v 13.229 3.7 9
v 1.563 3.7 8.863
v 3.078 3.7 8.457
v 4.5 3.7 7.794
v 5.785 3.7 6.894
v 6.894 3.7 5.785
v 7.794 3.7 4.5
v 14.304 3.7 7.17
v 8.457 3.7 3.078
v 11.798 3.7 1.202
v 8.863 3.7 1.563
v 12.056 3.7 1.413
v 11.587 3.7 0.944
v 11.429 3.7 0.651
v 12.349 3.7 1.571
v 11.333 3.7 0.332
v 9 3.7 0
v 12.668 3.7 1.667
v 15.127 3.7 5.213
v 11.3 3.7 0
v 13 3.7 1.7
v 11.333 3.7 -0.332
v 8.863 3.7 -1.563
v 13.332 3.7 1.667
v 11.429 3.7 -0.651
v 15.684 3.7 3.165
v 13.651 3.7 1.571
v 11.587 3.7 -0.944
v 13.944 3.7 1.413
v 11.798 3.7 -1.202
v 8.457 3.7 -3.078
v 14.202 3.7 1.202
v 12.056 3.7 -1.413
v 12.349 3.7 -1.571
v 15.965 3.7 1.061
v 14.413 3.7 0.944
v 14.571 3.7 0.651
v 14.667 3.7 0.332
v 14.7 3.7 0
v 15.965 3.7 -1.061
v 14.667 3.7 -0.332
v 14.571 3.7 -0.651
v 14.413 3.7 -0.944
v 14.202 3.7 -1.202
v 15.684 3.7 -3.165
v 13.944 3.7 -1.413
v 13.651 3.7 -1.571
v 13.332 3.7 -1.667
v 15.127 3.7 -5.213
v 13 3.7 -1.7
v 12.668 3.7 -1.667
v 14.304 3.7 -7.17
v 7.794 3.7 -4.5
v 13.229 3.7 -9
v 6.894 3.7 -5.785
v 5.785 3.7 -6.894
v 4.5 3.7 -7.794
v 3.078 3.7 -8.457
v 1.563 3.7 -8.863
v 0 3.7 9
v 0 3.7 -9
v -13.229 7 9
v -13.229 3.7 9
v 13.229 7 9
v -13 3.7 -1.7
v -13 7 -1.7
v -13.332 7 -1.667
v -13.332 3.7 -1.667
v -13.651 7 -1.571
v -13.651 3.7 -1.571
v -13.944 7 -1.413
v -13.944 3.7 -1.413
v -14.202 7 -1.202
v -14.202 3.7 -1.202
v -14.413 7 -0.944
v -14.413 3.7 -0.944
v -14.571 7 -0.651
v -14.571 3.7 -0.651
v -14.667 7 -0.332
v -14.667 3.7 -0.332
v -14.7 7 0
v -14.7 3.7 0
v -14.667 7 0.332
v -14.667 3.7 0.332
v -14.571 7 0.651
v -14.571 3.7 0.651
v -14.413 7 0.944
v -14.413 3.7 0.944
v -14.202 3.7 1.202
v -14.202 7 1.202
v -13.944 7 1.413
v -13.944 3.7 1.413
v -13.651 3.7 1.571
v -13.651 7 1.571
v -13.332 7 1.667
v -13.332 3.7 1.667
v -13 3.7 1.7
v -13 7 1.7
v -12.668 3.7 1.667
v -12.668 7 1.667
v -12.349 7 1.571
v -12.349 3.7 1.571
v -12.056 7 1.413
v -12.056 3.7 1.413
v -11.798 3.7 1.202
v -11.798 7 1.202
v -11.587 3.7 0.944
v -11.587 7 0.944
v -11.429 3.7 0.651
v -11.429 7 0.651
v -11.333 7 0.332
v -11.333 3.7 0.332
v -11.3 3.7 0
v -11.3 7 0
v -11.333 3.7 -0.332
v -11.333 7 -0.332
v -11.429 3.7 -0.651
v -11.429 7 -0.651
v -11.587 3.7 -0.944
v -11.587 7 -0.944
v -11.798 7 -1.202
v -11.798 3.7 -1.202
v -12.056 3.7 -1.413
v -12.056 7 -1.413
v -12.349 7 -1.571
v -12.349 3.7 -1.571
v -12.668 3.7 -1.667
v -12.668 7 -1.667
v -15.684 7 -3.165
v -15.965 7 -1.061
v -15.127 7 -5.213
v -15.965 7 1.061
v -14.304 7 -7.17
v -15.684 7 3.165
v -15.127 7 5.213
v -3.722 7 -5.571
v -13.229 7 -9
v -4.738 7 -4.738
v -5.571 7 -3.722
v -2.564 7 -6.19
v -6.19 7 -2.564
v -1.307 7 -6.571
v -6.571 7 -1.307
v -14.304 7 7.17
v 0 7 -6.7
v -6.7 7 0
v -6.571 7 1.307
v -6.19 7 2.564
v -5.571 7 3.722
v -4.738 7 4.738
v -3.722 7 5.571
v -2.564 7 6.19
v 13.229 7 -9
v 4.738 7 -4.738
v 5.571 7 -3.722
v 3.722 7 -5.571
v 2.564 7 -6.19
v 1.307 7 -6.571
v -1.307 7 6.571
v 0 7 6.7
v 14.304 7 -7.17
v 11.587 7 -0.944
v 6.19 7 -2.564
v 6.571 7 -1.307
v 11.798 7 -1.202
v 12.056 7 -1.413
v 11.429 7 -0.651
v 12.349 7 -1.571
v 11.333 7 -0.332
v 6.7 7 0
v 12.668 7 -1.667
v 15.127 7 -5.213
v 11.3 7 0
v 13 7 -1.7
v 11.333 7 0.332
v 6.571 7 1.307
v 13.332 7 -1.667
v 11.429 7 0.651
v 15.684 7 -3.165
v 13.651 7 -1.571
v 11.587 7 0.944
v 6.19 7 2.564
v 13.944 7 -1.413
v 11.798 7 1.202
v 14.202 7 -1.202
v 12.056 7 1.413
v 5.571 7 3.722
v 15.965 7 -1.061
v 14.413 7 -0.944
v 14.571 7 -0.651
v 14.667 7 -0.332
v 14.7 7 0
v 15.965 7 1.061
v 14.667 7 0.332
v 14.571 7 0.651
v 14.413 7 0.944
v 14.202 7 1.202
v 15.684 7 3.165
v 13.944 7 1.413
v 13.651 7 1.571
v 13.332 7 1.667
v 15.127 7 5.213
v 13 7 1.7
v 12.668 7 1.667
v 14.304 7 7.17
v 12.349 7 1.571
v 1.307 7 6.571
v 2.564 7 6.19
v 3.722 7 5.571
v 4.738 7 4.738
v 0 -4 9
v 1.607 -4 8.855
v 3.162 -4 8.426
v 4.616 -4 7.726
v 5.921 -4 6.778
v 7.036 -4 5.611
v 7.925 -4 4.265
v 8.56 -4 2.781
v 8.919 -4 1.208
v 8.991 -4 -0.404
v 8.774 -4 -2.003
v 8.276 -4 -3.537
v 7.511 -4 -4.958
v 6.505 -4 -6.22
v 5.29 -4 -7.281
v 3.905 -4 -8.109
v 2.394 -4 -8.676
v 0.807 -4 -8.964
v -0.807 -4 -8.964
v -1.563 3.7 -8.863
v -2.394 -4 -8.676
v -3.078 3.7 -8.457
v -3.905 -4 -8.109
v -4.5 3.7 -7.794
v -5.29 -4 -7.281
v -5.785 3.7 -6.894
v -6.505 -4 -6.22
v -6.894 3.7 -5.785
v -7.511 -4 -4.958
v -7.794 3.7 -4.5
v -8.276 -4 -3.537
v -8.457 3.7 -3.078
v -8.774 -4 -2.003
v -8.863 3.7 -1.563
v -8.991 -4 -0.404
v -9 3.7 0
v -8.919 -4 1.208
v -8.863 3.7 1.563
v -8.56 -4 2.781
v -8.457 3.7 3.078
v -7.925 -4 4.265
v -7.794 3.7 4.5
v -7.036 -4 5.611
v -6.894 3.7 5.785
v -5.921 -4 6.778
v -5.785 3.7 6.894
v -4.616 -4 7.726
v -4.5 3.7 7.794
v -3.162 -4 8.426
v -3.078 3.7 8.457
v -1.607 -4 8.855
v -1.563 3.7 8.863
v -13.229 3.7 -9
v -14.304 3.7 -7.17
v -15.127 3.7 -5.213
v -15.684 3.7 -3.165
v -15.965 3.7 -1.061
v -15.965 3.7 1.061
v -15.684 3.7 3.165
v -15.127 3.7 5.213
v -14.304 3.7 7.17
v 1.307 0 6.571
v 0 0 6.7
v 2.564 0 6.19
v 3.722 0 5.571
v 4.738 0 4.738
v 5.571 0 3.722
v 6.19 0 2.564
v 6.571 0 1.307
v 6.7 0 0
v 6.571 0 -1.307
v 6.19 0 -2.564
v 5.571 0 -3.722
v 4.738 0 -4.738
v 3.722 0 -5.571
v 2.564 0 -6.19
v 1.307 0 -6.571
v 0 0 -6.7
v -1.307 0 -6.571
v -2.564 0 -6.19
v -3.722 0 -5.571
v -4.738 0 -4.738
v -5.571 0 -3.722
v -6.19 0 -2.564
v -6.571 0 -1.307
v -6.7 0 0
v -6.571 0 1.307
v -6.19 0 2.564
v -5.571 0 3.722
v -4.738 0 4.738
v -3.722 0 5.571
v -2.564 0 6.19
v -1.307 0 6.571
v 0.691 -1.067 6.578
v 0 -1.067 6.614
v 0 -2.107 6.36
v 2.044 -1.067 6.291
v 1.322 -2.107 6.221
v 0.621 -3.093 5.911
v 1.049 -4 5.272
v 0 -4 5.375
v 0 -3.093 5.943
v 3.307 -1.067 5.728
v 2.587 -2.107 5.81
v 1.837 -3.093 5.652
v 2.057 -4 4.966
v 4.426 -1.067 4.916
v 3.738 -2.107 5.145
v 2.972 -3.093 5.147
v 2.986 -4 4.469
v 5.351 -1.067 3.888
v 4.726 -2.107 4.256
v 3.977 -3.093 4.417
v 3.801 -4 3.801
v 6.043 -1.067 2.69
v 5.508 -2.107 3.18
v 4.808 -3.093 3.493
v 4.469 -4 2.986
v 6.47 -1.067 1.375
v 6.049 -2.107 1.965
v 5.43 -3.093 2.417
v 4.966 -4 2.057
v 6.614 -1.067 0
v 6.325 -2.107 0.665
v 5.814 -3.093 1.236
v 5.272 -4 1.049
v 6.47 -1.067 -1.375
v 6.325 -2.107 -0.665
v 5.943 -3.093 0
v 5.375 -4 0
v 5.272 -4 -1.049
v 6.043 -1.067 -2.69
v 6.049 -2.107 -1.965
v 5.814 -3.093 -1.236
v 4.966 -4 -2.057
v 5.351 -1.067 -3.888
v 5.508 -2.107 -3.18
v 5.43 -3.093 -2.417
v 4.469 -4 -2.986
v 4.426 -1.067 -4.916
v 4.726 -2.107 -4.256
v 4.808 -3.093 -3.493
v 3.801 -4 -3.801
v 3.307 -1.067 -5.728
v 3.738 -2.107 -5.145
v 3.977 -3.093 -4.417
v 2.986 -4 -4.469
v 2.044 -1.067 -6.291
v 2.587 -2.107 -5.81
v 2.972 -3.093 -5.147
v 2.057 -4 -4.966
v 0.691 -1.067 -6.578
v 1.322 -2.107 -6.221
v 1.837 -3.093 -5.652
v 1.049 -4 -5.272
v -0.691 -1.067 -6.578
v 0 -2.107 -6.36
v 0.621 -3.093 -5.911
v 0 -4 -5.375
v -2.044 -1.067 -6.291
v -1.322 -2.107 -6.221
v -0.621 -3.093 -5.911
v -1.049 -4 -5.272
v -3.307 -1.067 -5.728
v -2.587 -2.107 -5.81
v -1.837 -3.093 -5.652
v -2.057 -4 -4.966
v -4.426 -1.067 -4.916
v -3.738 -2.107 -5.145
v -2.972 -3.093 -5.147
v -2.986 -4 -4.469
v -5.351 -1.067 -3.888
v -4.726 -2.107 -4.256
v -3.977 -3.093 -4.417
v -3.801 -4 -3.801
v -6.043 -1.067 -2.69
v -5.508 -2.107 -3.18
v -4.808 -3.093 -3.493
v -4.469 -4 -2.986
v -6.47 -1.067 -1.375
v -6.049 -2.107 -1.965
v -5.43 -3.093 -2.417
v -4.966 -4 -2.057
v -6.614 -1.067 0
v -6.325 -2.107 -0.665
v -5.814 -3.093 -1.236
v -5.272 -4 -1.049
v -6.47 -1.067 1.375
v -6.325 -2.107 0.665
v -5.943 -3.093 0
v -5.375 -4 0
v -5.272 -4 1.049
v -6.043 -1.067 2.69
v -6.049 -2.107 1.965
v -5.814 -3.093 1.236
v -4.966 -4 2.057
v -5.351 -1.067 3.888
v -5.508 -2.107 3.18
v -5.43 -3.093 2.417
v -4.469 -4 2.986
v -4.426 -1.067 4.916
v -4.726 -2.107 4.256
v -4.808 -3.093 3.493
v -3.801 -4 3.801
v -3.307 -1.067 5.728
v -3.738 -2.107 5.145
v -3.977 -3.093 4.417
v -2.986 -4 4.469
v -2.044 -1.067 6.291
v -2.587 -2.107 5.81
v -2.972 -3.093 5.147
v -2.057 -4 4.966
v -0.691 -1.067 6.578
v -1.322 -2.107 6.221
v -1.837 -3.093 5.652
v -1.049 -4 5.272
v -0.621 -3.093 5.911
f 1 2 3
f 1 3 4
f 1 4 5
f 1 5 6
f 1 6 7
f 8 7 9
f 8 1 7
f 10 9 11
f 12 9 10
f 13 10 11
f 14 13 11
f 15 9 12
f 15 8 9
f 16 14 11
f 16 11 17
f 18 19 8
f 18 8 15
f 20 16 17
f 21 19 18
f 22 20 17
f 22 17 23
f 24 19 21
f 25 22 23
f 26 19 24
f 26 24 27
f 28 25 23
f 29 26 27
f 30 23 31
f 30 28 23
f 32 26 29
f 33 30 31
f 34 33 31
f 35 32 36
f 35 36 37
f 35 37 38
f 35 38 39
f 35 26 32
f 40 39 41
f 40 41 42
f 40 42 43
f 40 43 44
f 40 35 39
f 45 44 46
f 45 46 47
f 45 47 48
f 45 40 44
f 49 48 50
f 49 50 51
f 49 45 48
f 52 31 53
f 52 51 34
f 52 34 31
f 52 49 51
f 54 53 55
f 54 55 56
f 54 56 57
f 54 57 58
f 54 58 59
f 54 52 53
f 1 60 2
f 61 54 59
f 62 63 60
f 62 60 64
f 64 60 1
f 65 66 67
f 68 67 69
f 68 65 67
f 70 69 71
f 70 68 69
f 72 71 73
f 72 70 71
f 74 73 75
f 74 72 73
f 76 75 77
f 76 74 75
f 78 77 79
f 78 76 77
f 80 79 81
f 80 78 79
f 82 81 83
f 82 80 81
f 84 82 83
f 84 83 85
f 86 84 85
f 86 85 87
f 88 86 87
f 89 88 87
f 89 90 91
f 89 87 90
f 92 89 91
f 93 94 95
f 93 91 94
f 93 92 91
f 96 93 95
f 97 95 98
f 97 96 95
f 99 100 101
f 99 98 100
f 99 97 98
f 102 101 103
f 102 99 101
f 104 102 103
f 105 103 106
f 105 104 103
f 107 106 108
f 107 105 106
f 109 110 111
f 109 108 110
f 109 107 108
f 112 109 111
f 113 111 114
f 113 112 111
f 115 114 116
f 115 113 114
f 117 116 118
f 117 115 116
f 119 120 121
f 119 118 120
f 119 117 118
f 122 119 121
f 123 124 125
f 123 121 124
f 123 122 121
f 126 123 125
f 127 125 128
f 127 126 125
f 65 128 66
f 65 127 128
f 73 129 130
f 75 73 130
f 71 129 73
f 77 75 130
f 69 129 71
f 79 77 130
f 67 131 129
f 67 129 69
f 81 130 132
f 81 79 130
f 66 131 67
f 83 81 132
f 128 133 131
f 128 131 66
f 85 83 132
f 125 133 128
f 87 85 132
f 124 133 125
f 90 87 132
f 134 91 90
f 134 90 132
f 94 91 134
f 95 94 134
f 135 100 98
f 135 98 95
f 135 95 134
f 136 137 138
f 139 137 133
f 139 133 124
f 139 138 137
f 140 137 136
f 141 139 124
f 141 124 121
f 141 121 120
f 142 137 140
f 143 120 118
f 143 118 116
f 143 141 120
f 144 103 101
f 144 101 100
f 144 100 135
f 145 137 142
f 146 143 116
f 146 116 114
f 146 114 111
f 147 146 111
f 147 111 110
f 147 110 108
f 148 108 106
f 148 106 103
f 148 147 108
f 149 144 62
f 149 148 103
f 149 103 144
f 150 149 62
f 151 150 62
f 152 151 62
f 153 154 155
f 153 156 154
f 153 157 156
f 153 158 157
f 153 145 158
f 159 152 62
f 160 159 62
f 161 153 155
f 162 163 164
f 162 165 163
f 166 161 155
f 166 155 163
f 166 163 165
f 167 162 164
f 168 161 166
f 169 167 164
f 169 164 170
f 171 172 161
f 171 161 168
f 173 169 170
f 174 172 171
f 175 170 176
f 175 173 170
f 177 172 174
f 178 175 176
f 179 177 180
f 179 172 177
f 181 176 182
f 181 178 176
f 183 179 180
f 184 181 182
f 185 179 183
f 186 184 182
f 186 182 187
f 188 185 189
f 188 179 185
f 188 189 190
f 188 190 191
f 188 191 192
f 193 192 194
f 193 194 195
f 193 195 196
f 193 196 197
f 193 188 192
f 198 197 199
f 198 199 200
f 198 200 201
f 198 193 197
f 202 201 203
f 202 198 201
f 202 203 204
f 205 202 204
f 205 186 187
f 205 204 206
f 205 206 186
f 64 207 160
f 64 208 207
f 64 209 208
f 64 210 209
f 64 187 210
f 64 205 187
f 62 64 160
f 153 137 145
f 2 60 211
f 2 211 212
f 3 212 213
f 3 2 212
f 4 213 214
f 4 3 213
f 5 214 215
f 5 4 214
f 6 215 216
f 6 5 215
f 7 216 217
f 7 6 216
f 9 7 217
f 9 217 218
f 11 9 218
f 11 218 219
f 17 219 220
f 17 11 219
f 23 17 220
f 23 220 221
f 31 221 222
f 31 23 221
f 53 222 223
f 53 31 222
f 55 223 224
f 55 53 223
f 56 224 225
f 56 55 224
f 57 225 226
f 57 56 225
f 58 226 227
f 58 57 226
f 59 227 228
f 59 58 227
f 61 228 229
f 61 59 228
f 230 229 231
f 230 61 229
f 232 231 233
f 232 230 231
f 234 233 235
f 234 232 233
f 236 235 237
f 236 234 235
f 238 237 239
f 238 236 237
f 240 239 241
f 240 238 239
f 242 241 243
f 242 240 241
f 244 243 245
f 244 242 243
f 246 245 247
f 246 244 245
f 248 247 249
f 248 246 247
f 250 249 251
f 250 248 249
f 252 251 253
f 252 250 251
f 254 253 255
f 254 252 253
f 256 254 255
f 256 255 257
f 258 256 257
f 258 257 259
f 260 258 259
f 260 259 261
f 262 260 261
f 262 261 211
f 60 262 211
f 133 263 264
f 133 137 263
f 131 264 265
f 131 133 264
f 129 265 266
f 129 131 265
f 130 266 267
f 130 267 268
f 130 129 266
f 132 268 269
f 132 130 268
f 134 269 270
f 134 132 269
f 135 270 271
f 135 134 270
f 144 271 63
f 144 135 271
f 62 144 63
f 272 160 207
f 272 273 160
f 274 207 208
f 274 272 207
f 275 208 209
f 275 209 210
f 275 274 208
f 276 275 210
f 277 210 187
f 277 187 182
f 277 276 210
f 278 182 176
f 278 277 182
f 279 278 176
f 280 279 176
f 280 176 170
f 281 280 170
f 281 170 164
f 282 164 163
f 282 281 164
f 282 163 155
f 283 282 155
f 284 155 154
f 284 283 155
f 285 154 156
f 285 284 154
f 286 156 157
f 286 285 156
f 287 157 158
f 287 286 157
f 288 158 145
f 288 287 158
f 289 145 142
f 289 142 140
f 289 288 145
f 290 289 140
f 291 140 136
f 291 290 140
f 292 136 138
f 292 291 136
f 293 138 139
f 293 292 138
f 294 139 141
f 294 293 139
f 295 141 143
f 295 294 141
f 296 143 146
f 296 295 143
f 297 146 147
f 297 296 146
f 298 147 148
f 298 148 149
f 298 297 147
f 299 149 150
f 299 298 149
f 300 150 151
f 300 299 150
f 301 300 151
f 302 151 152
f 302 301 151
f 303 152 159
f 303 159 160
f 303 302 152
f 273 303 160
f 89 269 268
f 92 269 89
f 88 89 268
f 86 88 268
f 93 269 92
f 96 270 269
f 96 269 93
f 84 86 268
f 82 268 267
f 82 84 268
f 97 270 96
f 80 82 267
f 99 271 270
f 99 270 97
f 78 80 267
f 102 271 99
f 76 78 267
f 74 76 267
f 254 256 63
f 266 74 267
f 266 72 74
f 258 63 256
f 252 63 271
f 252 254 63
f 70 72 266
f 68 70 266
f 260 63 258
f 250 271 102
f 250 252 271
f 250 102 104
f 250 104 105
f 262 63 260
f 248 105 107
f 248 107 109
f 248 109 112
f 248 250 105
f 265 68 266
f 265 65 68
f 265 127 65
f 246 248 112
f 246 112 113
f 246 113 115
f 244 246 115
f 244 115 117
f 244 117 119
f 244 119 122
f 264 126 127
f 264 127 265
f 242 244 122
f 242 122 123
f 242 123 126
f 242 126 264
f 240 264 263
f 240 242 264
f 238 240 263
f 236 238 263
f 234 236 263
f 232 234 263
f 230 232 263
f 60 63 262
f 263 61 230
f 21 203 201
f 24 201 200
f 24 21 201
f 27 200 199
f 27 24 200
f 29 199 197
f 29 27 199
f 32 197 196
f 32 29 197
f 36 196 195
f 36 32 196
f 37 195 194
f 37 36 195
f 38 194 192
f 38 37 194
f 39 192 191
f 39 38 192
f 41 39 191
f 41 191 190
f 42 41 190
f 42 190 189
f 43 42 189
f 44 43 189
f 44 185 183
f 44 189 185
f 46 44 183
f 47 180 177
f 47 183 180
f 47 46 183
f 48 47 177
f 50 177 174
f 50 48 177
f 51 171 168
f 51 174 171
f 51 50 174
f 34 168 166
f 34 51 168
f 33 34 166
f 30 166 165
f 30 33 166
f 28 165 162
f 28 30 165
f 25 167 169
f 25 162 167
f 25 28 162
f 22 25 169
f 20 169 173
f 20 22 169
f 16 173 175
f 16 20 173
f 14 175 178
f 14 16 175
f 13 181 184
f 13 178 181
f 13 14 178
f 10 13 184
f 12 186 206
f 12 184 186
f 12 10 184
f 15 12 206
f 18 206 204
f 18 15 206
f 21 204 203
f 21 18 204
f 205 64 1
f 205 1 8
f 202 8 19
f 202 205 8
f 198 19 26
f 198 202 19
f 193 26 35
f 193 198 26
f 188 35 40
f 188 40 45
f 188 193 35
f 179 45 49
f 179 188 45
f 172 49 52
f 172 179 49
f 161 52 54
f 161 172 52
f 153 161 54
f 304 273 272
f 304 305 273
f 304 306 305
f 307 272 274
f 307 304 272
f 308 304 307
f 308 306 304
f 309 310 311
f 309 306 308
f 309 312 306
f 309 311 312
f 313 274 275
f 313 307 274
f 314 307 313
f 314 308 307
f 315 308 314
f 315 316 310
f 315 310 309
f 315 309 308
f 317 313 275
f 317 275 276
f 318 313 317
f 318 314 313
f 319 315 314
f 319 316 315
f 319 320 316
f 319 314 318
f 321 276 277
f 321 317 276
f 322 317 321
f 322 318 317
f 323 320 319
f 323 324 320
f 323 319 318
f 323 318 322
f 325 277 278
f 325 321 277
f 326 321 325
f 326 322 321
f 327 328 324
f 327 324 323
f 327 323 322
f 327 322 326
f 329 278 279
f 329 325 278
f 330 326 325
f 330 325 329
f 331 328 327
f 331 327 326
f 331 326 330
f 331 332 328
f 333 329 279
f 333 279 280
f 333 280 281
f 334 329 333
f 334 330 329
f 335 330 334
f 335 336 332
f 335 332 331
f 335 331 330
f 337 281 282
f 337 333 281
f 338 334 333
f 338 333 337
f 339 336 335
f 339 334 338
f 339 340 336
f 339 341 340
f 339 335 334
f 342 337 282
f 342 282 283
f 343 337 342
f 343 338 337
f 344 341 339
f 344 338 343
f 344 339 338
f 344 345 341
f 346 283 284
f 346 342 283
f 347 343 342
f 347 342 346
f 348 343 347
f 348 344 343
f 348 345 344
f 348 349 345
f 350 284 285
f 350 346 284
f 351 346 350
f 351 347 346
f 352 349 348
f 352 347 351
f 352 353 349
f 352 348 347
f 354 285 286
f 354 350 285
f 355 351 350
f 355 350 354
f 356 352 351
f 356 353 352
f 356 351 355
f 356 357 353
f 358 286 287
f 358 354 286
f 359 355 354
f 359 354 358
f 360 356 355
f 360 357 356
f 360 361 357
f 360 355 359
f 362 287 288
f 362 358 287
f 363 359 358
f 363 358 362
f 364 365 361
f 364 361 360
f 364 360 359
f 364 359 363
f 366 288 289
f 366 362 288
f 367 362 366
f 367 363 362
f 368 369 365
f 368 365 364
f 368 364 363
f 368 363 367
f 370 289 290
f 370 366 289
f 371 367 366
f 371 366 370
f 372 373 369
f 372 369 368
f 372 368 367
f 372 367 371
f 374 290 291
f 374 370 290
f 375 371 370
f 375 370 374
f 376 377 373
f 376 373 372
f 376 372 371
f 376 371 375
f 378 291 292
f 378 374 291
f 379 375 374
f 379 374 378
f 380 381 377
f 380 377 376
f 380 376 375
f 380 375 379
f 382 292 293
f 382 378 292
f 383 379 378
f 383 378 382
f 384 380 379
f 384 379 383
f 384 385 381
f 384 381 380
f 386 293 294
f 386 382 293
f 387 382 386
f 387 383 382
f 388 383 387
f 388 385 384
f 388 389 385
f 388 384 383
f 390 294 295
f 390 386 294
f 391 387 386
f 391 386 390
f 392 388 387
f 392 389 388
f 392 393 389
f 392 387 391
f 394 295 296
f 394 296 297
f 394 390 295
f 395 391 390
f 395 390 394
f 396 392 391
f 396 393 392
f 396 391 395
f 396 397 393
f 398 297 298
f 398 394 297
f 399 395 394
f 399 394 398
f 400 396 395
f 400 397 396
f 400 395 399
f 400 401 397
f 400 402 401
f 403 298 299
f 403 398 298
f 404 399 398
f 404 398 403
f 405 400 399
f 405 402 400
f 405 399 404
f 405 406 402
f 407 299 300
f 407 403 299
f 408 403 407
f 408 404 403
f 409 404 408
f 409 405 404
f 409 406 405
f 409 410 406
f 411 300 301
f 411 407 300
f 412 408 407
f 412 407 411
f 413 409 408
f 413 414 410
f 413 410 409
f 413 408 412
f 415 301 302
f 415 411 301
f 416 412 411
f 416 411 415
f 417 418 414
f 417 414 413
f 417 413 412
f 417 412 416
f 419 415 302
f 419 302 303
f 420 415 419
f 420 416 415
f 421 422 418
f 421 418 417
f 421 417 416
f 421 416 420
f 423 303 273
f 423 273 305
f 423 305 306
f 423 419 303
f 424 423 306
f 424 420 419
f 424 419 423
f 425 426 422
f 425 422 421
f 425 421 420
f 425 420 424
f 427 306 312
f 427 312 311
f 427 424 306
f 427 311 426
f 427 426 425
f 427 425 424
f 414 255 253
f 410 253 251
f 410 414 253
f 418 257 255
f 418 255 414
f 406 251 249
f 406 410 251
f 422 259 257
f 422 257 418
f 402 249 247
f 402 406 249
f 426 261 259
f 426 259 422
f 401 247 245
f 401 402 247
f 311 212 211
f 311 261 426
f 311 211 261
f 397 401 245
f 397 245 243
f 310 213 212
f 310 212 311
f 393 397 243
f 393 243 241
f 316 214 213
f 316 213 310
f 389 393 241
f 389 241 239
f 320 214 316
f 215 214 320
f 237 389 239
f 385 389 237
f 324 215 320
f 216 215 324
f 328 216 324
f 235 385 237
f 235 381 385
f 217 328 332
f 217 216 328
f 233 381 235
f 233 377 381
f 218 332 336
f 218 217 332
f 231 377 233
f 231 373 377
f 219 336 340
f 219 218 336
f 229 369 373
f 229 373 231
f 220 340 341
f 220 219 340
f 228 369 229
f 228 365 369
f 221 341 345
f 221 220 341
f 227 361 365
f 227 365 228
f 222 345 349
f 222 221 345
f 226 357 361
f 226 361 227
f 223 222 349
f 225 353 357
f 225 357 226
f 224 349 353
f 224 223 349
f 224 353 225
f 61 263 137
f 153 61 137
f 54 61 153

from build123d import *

# Parameters (mm, degrees)
CIRPATTERN2_COUNT  = 2
SKETCH5_W          = 50.426982916
SKETCH5_H          = 37.261009064
SKETCH5_W_2        = 37.991098709
SKETCH5_H_2        = 18
CUT_EXTRUDE1_DEPTH = 4.3


with BuildPart() as part:
    # Sketch1 → Revolve1 (revolve)
    with BuildSketch(Plane(origin=(0, 0, 0), x_dir=(0, 0, -1), z_dir=(1, 0, 0))):
        with BuildLine():
            ThreePointArc((-6.7, 0), (-6.360114404, -2.10688034), (-5.37494186, -4))
            Line((-5.37494186, -4), (-9, -4))
            Line((-9, -4), (-9, 3.7))
            Line((-9, 3.7), (-16, 3.7))
            Line((-16, 3.7), (-16, 7))
            Line((-16, 7), (-6.7, 7))
            Line((-6.7, 7), (-6.7, 0))
        make_face()
    revolve(axis=Axis((0, 0, 0), (0, 1, 0)))

    # Sketch3 → M3 Clearance Hole1 (revolve, cut)
    with BuildSketch(Plane(origin=(-13, 3.7, 0), x_dir=(0, 0, -1), z_dir=(1, 0, 0))):
        Polygon((0, 0), (0, 11.021463052), (1.7, 10), (1.7, 0), align=None)
    m3_clearance_hole1 = revolve(axis=Axis((-13, -2.65, 0), (0, 1, 0)), mode=Mode.SUBTRACT)

    # CirPattern2: M3 Clearance Hole1 ×2 about axis
    cirpattern2_axis = Axis((0, 0, 0), (0, 1, 0))
    for i in range(1, CIRPATTERN2_COUNT):
        add(m3_clearance_hole1.rotate(cirpattern2_axis, i * 360 / CIRPATTERN2_COUNT), mode=Mode.SUBTRACT)

    # Sketch5 → Cut-Extrude1 (cut, through all)
    with BuildSketch(Plane.XZ.offset(-3.7)):
        with Locations((1.488148737, -0.857756759)):
            Rectangle(SKETCH5_W, SKETCH5_H)
        with Locations((1.919239442, 0)):
            Rectangle(SKETCH5_W_2, SKETCH5_H_2, mode=Mode.SUBTRACT)
    extrude(amount=-CUT_EXTRUDE1_DEPTH, mode=Mode.SUBTRACT)


solid = part.part
